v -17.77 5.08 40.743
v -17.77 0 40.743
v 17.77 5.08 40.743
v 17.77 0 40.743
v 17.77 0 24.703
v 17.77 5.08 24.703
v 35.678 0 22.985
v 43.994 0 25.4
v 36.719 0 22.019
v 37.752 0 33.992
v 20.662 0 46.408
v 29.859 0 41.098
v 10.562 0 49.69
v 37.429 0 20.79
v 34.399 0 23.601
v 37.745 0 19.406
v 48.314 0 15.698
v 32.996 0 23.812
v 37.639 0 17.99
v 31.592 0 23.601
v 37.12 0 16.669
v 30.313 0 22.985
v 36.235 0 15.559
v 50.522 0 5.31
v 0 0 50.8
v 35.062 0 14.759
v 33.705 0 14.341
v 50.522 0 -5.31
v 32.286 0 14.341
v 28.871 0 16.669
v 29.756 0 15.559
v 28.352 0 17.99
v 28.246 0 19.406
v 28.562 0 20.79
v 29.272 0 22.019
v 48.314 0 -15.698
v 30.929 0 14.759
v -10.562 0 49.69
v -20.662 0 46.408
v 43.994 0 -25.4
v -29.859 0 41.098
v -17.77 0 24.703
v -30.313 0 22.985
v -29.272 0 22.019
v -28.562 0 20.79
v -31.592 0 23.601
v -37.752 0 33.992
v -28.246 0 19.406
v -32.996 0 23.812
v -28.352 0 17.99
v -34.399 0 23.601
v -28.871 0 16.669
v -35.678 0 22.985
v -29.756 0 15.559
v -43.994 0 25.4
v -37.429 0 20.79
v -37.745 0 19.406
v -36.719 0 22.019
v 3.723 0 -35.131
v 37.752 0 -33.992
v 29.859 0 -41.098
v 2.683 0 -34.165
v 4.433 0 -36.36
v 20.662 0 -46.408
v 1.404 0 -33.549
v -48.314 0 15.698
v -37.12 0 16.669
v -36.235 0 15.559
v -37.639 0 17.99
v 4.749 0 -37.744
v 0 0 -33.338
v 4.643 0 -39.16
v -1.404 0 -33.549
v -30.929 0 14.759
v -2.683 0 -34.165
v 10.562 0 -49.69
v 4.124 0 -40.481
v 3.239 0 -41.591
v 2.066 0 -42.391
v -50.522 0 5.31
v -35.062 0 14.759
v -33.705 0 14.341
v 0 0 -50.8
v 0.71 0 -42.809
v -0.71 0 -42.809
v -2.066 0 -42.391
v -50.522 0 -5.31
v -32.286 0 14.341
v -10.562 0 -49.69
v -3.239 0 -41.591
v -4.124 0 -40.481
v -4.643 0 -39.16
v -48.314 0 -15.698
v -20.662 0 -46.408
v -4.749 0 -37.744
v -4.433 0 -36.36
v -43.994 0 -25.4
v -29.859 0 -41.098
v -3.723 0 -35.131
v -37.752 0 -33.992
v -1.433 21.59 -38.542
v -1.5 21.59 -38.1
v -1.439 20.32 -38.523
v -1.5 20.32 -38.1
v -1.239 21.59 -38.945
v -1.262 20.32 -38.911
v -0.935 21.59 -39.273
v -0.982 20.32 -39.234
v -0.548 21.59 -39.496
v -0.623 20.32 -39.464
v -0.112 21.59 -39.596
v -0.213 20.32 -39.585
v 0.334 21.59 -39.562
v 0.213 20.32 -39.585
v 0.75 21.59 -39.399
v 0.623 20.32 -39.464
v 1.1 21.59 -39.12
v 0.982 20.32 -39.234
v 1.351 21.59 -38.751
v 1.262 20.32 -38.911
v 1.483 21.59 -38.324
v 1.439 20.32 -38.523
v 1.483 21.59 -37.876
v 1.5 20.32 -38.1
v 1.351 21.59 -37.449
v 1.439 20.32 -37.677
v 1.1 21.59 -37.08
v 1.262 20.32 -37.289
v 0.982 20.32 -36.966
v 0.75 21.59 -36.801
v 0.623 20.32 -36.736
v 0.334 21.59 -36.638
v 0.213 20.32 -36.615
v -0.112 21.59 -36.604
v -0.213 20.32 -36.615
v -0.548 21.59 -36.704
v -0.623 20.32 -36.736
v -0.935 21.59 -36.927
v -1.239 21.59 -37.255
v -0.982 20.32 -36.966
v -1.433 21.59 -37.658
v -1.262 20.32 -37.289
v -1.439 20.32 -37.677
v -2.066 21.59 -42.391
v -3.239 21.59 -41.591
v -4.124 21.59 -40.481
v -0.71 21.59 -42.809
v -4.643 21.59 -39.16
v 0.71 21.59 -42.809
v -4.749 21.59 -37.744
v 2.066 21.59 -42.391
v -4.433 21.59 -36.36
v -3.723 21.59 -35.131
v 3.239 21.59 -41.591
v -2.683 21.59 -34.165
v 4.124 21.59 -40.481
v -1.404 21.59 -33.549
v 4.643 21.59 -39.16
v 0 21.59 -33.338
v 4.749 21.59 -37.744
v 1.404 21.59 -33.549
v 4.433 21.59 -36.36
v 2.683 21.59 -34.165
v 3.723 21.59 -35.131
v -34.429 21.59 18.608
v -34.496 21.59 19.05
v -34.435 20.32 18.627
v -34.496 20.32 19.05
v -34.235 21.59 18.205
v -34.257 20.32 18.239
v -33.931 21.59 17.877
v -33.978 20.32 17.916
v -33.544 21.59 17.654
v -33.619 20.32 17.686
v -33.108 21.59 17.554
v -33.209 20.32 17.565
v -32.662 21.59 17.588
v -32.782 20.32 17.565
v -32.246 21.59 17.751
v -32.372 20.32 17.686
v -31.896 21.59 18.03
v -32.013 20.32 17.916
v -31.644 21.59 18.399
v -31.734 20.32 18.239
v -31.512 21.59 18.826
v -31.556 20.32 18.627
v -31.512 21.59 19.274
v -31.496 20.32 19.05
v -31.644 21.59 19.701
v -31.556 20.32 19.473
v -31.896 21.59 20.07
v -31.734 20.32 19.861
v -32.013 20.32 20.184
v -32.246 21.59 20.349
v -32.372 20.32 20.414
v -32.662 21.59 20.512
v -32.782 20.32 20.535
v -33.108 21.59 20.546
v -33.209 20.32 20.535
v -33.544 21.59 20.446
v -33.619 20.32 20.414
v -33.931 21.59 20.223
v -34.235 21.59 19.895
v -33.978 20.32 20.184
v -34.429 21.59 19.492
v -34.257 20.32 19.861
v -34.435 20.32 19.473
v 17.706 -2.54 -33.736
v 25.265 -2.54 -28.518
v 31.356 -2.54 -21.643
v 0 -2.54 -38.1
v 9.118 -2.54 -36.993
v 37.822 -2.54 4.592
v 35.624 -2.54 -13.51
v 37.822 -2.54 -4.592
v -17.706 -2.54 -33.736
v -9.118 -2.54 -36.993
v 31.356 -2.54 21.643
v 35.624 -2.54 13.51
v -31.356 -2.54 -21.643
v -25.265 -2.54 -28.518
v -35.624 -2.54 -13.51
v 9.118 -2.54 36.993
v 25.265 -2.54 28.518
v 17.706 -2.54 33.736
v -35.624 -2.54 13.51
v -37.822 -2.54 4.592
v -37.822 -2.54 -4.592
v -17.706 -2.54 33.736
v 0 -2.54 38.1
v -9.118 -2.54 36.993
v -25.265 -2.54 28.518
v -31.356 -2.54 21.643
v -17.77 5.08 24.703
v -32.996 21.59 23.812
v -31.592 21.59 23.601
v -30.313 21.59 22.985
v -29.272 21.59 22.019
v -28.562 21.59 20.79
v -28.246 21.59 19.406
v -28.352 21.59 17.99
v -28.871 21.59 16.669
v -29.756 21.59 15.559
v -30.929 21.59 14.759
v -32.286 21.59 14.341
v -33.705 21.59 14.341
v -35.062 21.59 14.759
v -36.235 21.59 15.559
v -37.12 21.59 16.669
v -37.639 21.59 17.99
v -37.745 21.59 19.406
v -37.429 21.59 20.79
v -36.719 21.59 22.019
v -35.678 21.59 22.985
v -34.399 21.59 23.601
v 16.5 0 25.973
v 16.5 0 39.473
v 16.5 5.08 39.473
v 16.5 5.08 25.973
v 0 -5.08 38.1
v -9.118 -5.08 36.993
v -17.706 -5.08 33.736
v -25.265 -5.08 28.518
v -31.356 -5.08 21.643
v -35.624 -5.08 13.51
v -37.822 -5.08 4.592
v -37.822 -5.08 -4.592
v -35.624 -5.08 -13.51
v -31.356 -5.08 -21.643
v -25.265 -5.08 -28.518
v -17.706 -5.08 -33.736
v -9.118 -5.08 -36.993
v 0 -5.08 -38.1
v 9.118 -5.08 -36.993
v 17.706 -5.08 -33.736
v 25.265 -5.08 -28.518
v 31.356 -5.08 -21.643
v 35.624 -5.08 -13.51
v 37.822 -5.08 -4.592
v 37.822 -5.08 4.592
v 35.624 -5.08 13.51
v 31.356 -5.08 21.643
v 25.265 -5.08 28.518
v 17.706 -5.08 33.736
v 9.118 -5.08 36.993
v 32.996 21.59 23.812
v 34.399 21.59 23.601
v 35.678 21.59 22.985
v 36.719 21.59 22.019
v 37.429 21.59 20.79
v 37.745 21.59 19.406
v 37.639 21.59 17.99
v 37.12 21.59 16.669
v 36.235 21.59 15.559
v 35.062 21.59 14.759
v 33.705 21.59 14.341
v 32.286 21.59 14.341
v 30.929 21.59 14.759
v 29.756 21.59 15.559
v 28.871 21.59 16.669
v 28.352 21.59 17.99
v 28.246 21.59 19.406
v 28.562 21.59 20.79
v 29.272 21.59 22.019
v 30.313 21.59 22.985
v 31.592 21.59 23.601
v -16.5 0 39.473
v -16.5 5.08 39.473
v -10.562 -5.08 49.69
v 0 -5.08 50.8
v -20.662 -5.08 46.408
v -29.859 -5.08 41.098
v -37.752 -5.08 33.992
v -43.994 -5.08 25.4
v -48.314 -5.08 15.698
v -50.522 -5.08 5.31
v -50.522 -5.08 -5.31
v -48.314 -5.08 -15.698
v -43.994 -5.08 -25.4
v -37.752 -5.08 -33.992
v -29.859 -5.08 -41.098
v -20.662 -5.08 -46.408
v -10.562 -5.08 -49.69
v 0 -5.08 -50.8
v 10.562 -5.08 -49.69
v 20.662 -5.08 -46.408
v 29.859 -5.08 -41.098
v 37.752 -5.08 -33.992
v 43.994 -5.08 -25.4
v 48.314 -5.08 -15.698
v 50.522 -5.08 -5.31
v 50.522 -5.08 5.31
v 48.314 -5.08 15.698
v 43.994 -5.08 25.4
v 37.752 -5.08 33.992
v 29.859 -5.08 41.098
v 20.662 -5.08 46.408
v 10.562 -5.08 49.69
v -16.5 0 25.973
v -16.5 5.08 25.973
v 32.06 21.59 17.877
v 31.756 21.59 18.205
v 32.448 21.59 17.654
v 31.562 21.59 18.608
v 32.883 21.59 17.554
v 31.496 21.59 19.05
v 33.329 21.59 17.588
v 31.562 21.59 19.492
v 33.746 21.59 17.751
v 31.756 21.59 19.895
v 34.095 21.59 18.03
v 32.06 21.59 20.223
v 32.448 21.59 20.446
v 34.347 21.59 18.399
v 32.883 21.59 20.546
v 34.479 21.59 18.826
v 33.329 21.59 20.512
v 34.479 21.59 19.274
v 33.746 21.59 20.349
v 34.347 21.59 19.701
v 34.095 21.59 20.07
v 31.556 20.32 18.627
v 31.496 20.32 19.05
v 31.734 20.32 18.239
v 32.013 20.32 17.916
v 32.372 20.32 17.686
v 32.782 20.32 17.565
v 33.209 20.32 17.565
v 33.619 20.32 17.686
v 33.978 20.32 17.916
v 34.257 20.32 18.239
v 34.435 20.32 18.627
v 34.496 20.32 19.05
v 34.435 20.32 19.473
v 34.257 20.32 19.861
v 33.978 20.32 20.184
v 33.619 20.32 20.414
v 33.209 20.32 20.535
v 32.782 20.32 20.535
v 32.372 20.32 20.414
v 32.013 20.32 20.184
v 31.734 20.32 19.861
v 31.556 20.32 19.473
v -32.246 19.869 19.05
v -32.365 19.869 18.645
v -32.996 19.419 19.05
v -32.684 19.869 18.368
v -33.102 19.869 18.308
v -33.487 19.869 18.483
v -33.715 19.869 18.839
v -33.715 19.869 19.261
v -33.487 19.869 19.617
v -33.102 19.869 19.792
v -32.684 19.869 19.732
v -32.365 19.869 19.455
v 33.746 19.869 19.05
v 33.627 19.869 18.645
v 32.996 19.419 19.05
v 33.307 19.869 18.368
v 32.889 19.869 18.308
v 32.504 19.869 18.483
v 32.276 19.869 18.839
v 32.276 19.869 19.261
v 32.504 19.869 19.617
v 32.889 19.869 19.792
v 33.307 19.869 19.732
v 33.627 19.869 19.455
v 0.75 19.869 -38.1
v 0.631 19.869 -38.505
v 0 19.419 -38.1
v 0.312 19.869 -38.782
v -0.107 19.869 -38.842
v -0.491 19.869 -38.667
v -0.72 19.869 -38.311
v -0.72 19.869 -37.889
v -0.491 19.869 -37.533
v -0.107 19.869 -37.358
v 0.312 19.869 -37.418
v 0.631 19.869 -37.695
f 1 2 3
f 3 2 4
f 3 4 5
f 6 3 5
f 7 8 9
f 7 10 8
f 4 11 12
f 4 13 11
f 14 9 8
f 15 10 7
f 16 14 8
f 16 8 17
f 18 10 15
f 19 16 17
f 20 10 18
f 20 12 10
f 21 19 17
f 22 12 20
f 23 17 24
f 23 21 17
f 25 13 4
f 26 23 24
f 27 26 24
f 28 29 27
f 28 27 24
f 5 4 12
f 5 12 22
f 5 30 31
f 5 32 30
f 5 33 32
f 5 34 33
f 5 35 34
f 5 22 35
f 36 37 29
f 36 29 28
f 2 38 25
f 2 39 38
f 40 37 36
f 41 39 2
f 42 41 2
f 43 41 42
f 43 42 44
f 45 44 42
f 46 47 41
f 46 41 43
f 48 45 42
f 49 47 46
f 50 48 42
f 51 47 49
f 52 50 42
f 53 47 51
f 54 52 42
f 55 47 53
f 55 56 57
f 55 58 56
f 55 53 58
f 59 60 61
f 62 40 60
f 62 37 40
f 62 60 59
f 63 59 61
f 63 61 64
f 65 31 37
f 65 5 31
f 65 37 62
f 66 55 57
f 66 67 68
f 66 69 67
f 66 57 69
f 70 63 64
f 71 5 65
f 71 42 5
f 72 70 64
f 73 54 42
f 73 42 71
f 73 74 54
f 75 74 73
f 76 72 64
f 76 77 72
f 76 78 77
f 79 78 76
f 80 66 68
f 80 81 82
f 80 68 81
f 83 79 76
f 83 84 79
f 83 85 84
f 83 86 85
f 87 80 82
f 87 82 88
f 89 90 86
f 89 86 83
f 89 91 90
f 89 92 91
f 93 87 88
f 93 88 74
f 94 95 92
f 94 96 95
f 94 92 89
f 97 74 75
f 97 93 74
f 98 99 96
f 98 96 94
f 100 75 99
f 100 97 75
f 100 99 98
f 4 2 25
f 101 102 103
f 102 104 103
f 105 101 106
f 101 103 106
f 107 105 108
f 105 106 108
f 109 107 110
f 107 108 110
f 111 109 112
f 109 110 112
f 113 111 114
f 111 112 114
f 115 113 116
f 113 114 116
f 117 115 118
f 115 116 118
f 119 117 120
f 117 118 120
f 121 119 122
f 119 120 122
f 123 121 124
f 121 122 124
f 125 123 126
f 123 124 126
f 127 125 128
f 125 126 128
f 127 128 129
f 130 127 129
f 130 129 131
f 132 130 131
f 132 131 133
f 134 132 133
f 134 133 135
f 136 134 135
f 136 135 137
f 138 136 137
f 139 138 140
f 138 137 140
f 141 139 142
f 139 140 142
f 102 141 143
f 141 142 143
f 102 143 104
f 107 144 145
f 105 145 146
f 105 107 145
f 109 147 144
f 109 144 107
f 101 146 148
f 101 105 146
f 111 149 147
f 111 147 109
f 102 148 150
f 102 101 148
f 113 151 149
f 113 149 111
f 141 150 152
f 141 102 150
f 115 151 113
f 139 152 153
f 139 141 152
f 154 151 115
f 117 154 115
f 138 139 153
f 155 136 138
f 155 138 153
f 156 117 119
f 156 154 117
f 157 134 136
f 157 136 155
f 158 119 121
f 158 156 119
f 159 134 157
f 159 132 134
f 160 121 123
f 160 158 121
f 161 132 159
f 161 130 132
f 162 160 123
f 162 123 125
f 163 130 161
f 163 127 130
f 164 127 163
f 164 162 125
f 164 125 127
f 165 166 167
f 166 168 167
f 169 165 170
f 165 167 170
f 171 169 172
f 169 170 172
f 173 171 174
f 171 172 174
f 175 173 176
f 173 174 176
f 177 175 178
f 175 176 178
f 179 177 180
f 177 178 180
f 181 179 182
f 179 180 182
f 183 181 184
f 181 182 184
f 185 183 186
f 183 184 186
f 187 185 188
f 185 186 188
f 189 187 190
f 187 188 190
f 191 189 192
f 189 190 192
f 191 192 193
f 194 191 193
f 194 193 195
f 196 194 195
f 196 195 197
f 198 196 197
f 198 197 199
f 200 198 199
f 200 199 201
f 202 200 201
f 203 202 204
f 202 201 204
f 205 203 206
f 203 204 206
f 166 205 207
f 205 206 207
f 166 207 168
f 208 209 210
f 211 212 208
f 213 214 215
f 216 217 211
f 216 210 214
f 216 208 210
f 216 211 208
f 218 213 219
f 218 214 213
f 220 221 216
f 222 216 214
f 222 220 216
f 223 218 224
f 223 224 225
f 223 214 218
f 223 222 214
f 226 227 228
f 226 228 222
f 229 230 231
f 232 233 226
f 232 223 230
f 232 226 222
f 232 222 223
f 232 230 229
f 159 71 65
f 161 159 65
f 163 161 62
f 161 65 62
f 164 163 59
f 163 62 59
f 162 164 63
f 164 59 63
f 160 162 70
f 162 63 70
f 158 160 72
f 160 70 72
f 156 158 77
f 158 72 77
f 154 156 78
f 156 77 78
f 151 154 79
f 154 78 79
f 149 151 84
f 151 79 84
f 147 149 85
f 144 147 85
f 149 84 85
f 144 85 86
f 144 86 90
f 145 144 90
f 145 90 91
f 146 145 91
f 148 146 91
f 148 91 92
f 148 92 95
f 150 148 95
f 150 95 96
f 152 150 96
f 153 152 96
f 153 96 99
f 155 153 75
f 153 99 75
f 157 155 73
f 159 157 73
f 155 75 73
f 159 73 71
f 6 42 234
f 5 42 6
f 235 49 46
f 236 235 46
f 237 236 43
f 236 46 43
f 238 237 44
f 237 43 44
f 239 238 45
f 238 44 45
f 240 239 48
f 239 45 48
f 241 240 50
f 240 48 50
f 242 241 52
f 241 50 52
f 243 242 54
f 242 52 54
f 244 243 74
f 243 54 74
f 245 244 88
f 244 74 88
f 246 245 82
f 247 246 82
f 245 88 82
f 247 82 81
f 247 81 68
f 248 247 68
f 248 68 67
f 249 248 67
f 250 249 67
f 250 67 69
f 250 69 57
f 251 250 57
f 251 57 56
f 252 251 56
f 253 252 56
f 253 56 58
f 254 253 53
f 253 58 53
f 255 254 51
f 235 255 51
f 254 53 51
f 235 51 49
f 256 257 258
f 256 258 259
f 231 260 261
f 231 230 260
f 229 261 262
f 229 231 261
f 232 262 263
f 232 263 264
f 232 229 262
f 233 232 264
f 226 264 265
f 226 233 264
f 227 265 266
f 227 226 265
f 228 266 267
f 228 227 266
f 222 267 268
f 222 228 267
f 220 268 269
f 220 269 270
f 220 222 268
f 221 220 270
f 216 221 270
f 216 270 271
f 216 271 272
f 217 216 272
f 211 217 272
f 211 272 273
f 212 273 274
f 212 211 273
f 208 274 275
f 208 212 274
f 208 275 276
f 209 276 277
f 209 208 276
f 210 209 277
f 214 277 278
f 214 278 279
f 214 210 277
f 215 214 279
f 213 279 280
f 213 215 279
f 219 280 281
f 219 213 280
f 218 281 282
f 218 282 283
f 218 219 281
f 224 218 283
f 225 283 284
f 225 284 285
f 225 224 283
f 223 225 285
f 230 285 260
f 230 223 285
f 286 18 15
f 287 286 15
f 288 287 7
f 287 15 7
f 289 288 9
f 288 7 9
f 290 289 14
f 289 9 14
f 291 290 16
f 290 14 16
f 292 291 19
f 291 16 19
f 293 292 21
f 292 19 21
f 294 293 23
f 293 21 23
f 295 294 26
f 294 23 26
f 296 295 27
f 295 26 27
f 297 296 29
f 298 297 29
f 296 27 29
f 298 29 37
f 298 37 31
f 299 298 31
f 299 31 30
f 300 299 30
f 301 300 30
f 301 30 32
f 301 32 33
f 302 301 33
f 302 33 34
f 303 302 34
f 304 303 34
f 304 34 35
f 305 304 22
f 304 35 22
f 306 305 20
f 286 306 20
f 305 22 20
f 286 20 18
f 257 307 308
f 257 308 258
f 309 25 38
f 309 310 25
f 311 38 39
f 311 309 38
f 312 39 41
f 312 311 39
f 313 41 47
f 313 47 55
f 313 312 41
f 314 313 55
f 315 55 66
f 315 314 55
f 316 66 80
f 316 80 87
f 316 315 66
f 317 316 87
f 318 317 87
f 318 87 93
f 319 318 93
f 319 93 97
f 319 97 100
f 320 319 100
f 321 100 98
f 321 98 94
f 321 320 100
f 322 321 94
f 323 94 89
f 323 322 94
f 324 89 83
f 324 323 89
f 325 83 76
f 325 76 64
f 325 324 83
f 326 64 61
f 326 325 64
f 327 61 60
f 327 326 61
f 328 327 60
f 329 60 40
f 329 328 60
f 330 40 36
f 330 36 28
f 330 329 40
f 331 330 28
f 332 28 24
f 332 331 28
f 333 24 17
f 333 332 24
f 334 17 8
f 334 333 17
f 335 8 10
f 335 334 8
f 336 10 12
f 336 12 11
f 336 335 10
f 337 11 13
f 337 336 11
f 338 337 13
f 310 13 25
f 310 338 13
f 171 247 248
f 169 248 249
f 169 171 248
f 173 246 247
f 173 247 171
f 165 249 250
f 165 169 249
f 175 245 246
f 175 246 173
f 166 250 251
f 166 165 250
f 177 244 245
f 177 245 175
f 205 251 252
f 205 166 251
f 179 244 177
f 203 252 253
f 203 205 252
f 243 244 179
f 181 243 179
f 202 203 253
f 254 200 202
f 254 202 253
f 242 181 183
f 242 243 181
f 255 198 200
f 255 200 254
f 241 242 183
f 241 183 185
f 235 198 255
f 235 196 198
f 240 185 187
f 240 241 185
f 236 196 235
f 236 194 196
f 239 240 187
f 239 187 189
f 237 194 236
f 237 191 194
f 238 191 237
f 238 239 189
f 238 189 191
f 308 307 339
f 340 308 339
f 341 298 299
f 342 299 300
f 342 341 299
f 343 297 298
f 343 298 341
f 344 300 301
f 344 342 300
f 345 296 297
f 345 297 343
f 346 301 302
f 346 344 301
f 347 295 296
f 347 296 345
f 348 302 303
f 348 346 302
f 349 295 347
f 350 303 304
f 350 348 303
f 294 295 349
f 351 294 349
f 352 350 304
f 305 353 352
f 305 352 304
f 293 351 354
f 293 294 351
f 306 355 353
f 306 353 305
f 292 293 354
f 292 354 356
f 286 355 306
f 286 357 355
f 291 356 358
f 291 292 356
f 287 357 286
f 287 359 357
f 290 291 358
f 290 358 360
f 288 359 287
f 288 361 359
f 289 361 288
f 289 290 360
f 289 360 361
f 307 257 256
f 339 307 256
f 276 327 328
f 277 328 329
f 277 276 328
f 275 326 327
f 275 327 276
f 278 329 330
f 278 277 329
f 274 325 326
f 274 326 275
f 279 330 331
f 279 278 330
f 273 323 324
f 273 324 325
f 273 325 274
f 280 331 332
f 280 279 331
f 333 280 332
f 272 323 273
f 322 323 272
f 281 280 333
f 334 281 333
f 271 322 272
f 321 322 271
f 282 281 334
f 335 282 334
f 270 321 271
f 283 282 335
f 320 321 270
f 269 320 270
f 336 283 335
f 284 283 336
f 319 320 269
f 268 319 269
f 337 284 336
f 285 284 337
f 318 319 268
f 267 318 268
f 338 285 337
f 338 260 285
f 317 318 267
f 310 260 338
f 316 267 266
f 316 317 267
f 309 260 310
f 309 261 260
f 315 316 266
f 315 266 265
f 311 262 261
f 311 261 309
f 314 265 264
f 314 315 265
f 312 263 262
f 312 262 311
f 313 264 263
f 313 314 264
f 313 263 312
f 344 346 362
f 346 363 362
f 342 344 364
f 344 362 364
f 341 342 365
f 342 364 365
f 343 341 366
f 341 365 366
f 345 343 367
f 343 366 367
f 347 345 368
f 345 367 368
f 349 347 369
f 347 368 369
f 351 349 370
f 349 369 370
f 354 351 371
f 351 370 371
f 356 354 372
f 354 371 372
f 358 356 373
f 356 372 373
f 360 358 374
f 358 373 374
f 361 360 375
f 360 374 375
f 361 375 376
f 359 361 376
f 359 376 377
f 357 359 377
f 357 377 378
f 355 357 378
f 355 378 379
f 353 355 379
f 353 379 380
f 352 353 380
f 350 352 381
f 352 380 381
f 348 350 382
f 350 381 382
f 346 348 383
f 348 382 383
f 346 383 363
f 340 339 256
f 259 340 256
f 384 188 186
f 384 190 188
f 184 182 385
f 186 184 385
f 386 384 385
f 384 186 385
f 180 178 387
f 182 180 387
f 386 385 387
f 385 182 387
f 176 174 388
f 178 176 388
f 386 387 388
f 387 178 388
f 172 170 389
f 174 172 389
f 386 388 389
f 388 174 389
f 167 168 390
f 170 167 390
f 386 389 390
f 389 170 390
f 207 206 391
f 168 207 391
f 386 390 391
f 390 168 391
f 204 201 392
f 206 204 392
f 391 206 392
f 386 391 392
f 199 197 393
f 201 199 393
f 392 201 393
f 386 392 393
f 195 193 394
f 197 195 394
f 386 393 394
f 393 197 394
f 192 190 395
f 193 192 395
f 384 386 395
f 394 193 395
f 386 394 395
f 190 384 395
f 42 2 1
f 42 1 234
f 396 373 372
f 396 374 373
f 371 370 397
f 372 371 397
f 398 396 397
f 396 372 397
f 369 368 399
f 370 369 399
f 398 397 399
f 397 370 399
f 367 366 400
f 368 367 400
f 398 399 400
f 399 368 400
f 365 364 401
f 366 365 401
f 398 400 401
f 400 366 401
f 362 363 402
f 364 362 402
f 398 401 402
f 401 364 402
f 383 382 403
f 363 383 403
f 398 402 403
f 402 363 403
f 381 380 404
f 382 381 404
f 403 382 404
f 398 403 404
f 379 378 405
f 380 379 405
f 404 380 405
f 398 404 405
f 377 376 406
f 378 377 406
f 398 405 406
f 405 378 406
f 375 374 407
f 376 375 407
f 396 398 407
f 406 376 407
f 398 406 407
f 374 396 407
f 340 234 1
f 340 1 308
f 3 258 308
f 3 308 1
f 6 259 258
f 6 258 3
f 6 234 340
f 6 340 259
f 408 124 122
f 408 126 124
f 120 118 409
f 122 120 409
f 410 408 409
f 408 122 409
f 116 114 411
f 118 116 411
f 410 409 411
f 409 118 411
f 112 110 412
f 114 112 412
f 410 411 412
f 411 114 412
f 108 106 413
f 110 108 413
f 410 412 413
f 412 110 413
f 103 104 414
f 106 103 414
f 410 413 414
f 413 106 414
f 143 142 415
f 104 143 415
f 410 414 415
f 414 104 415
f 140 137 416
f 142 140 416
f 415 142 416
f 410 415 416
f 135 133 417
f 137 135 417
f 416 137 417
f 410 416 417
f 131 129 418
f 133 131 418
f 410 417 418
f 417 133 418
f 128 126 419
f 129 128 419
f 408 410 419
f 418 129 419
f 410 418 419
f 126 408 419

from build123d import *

# Parameters (mm, degrees)
SKETCH3_R                 = 4.7625
BOSS_EXTRUDE1_DEPTH       = 21.59
M4X0_7_TAPPED_HOLE1_D     = 3
M4X0_7_TAPPED_HOLE1_DEPTH = 1.27
M4X0_7_TAPPED_HOLE1_TIP   = 0.901290929
SKETCH12_W                = 35.54
SKETCH12_H                = 16.04
SKETCH12_W_2              = 33
SKETCH12_H_2              = 13.5
BOSS_EXTRUDE2_DEPTH       = 5.08


with BuildPart() as part:
    # Sketch1 → Revolve1 (revolve)
    with BuildSketch(Plane.XY, mode=Mode.PRIVATE) as revolve1_sk:
        Polygon((-38.1, -2.54), (0, -2.54), (0, 0), (-50.8, 0), (-50.8, -5.08), (-38.1, -5.08), align=None)
    revolve(revolve1_sk.sketch.rotate(Axis((0, 4.567685351, 0), (0, -1, 0)), 270), axis=Axis((0, 4.567685351, 0), (0, -1, 0)))

    # Sketch3 → Boss-Extrude1 (add)
    with BuildSketch(Plane(origin=(0, 0, 0), x_dir=(1, 0, 0), z_dir=(0, 1, 0))):
        with Locations(Location((0, 38.1, 0), (0, 0, 270))):
            Circle(SKETCH3_R)
        with Locations(Location((-32.995567884, -19.05, 0), (0, 0, 270))):
            Circle(SKETCH3_R)
        with Locations(Location((32.995567884, -19.05, 0), (0, 0, 270))):
            Circle(SKETCH3_R)
    extrude(amount=BOSS_EXTRUDE1_DEPTH)

    # M4x0.7 Tapped Hole1
    with Locations(Plane(origin=(0, 21.59, 0), x_dir=(1, 0, 0), z_dir=(0, 1, 0))):
        with Locations((-32.995567884, -19.05), (0, 38.1), (32.995567884, -19.05)):
            Hole(M4X0_7_TAPPED_HOLE1_D / 2, depth=M4X0_7_TAPPED_HOLE1_DEPTH)
            with Locations((0, 0, -(M4X0_7_TAPPED_HOLE1_DEPTH + M4X0_7_TAPPED_HOLE1_TIP / 2))):  # 118° drill point
                Cone(0, M4X0_7_TAPPED_HOLE1_D / 2, M4X0_7_TAPPED_HOLE1_TIP, mode=Mode.SUBTRACT)

    # Sketch12 → Boss-Extrude2 (add)
    with BuildSketch(Plane(origin=(0, 0, 0), x_dir=(1, 0, 0), z_dir=(0, 1, 0))):
        with Locations((0, -32.723460825)):
            Rectangle(SKETCH12_W, SKETCH12_H)
        with Locations((0, -32.723460825)):
            Rectangle(SKETCH12_W_2, SKETCH12_H_2, mode=Mode.SUBTRACT)
    extrude(amount=BOSS_EXTRUDE2_DEPTH)


solid = part.part
